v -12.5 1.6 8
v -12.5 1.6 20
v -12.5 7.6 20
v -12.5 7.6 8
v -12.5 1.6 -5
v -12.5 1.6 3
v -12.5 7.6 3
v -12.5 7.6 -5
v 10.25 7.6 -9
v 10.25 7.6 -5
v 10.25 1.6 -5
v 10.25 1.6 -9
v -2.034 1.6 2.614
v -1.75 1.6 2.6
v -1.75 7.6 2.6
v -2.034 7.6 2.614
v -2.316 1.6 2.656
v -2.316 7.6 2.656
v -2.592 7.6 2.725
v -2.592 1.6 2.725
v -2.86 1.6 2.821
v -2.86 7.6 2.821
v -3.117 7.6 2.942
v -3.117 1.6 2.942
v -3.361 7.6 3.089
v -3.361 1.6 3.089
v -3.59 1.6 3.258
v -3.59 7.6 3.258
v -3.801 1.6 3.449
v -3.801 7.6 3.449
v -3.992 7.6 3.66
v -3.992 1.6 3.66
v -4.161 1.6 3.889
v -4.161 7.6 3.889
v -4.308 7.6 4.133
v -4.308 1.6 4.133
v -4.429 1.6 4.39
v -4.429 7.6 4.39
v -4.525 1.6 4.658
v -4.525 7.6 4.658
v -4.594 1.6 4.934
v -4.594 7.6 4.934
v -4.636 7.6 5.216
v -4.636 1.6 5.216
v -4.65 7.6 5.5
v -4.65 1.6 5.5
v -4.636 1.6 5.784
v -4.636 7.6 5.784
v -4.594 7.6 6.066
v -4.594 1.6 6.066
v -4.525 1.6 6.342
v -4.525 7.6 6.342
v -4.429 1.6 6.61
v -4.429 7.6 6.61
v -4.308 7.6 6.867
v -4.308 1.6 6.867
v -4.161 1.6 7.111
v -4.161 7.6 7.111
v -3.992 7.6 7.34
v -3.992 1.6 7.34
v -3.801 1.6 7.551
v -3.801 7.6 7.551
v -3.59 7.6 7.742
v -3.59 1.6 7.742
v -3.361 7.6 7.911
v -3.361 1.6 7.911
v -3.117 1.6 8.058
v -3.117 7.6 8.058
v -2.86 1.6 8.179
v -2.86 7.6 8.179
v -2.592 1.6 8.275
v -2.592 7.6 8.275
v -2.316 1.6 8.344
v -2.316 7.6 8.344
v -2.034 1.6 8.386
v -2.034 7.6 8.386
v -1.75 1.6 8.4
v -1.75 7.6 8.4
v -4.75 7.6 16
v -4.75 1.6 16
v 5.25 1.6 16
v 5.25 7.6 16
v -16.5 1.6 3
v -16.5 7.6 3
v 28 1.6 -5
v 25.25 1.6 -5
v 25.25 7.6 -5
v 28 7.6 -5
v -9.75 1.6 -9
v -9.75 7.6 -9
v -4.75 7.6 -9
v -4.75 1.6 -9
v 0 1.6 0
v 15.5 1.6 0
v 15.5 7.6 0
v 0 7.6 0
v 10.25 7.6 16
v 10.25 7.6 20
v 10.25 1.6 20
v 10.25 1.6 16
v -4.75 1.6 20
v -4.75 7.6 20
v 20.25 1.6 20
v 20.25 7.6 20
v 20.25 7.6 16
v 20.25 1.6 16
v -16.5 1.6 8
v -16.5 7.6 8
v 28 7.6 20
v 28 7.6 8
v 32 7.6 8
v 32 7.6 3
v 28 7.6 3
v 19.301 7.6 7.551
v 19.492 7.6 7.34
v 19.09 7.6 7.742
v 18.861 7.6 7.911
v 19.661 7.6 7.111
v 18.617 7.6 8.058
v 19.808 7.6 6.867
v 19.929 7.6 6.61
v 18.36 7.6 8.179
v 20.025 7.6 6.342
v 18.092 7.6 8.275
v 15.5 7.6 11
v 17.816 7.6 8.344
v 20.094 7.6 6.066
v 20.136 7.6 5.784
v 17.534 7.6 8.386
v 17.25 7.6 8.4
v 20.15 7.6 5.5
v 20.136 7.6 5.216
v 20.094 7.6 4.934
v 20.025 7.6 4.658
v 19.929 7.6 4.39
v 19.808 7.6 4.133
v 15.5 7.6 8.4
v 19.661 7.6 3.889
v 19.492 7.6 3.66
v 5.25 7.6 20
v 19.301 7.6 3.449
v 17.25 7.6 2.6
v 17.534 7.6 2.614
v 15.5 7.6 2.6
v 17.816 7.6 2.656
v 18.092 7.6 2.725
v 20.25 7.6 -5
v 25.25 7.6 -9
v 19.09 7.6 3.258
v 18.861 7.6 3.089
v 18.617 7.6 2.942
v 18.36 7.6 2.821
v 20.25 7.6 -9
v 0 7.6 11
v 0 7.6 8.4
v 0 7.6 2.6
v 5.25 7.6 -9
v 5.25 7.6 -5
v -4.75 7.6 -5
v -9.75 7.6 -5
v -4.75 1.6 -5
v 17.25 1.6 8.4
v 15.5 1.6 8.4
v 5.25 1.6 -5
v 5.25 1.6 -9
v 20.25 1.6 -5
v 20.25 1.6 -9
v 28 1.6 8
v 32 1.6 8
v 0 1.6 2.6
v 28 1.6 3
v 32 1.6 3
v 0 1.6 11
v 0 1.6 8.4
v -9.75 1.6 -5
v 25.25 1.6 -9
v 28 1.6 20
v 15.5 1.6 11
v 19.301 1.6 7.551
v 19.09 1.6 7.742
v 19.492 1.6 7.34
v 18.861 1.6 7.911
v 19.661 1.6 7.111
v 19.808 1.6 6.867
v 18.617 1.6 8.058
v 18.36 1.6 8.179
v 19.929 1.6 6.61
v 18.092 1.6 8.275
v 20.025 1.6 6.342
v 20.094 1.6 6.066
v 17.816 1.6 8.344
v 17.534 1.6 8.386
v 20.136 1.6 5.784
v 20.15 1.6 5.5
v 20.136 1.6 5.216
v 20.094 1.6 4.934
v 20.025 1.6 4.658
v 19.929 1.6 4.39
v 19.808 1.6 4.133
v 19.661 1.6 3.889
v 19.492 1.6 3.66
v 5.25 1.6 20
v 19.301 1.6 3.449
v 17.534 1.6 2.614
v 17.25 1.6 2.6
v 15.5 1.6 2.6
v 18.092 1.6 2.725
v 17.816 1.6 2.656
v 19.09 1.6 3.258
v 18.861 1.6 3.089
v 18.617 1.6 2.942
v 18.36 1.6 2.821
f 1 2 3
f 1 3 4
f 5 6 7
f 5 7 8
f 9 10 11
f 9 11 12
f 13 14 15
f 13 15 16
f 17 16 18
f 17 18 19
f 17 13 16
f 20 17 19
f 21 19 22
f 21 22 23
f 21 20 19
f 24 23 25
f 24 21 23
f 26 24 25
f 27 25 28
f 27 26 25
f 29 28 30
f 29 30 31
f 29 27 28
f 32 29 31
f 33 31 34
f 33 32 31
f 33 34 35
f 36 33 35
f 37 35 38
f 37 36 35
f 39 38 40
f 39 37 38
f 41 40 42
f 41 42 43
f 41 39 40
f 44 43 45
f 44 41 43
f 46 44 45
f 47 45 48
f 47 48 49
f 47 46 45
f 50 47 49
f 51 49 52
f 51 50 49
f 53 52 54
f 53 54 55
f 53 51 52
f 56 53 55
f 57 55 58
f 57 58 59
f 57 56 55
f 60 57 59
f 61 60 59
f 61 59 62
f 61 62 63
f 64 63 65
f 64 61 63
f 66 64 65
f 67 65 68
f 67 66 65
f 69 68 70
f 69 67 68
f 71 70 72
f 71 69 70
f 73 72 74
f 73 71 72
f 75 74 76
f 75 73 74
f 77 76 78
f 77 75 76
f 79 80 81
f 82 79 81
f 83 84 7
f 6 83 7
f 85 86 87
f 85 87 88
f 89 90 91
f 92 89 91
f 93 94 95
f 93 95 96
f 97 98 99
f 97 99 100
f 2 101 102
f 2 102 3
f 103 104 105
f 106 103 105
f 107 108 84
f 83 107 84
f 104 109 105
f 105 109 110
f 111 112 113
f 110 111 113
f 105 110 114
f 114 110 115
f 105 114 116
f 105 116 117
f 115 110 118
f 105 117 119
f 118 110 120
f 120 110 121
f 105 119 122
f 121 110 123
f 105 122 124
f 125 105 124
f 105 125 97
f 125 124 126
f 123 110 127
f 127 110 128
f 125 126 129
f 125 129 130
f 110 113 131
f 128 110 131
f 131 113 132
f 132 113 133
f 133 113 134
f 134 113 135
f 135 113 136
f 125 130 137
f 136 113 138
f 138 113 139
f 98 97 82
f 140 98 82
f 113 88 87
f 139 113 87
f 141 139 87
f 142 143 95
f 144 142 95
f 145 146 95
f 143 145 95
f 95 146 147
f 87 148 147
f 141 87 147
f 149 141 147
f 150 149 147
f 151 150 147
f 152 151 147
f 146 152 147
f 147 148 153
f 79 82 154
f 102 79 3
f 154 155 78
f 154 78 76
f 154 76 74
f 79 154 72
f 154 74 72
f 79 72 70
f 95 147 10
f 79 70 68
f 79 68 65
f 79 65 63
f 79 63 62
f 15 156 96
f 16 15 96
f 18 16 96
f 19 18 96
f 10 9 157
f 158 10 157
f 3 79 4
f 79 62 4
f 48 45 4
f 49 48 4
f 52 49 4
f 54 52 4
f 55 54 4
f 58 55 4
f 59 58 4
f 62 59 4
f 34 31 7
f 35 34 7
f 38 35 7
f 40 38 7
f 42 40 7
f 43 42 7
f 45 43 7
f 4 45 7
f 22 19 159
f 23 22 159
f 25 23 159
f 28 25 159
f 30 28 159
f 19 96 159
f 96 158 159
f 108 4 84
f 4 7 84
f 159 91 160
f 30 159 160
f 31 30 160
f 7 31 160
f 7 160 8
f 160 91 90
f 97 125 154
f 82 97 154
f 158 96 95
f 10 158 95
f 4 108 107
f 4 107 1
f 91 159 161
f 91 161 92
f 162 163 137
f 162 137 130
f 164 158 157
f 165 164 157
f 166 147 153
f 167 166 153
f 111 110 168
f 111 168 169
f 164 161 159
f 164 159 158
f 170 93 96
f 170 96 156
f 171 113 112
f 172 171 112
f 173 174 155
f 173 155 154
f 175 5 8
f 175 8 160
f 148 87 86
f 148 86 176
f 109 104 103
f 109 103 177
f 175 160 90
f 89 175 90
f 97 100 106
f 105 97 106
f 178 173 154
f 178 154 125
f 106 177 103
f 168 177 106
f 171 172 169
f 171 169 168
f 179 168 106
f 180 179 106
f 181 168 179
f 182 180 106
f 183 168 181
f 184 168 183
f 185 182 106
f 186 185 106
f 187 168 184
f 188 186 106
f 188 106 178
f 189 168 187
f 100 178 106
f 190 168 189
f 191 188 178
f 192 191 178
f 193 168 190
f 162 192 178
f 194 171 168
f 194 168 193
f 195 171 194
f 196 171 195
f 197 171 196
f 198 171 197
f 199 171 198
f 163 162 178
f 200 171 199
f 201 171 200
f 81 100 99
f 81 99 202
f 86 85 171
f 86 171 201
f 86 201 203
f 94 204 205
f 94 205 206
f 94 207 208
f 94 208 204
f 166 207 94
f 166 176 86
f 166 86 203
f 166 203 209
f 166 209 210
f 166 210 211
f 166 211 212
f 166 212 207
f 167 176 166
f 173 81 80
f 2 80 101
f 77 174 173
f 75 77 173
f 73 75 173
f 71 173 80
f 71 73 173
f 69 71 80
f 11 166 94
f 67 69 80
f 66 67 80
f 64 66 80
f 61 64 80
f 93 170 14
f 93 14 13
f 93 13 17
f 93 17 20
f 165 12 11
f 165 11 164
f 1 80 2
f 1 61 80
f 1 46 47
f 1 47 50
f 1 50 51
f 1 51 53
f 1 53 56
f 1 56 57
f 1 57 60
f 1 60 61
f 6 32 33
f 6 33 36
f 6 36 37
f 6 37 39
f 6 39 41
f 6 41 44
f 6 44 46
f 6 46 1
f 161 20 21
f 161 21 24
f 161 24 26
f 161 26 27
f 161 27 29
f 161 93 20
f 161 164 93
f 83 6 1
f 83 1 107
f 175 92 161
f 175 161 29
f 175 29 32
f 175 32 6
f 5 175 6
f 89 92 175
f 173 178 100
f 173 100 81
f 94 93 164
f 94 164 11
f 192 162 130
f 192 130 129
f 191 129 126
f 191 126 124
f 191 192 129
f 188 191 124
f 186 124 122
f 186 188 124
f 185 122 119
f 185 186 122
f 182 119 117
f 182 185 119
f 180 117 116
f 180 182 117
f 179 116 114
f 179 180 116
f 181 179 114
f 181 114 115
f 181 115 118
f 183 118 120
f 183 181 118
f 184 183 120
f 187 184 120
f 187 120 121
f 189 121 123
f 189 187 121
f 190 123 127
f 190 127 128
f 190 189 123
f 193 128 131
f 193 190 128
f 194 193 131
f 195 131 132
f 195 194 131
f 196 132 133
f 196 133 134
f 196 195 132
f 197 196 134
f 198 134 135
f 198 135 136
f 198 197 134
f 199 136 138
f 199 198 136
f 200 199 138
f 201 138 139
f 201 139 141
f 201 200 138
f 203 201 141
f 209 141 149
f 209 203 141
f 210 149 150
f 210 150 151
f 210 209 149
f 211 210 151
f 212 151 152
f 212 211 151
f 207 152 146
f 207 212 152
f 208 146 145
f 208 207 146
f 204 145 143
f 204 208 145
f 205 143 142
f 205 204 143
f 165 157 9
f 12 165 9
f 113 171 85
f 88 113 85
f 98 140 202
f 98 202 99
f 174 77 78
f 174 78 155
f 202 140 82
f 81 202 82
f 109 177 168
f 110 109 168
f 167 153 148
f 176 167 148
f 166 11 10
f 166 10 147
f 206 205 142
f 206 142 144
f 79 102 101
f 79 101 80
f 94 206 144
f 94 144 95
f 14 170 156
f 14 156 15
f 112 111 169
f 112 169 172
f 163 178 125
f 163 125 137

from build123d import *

# Parameters (mm, degrees)
SKETCH1_W           = 15.5
SKETCH1_H           = 11
BOSS_EXTRUDE1_DEPTH = 1.6
BOSS_EXTRUDE2_DEPTH = 1.6
SKETCH3_W           = 40.5
SKETCH3_H           = 21
BOSS_EXTRUDE3_DEPTH = 6
CUT_EXTRUDE1_DEPTH  = 2.6
SKETCH5_W           = 5
SKETCH5_H           = 4
BOSS_EXTRUDE4_DEPTH = 6
LPATTERN1_COUNT     = 2
LPATTERN1_PITCH     = 15
LPATTERN1_COL_COUNT = 2
LPATTERN1_COL_PITCH = 15
SKETCH6_W           = 4
SKETCH6_H           = 5
BOSS_EXTRUDE5_DEPTH = 6
SKETCH7_W           = 2.75
SKETCH7_H           = 4
BOSS_EXTRUDE6_DEPTH = 6


with BuildPart() as part:
    # Sketch1 → Boss-Extrude1 (new body)
    with BuildSketch(Plane(origin=(0, 0, 0), x_dir=(1, 0, 0), z_dir=(0, 1, 0))):
        with Locations((7.75, -5.5)):
            Rectangle(SKETCH1_W, SKETCH1_H)
    extrude(amount=BOSS_EXTRUDE1_DEPTH)

    # Sketch2 → Boss-Extrude2 (add, through all)
    with BuildSketch(Plane(origin=(0, 1.6, 0), x_dir=(1, 0, 0), z_dir=(0, 1, 0))):
        with BuildLine():
            Line((-1.75, -4), (-1.75, -2.6))
            ThreePointArc((-1.75, -2.6), (-4.65, -5.5), (-1.75, -8.4))
            Line((-1.75, -8.4), (-1.75, -7))
            ThreePointArc((-1.75, -7), (-3.25, -5.5), (-1.75, -4))
        make_face()
        with BuildLine():
            ThreePointArc((0, -3.187533784), (-0.827002716, -2.750804479), (-1.75, -2.6))
            Line((-1.75, -2.6), (-1.75, -4))
            ThreePointArc((-1.75, -4), (-0.689339828, -4.439339828), (-0.25, -5.5))
            ThreePointArc((-0.25, -5.5), (-0.689339828, -6.560660172), (-1.75, -7))
            Line((-1.75, -7), (-1.75, -8.4))
            ThreePointArc((-1.75, -8.4), (-0.827002716, -8.249195521), (0, -7.812466216))
            Line((0, -7.812466216), (0, -3.187533784))
        make_face()
        with BuildLine():
            Line((0, -2.6), (-1.75, -2.6))
            ThreePointArc((-1.75, -2.6), (-0.827002716, -2.750804479), (0, -3.187533784))
            Line((0, -3.187533784), (0, -2.6))
        make_face()
        with BuildLine():
            ThreePointArc((0, -7.812466216), (-0.827002716, -8.249195521), (-1.75, -8.4))
            Line((-1.75, -8.4), (0, -8.4))
            Line((0, -8.4), (0, -7.812466216))
        make_face()
        with BuildLine():
            ThreePointArc((20.15, -5.5), (19.300609665, -3.449390335), (17.25, -2.6))
            Line((17.25, -2.6), (17.25, -4))
            ThreePointArc((17.25, -4), (18.310660172, -4.439339828), (18.75, -5.5))
            ThreePointArc((18.75, -5.5), (18.310660172, -6.560660172), (17.25, -7))
            Line((17.25, -7), (17.25, -8.4))
            ThreePointArc((17.25, -8.4), (19.300609665, -7.550609665), (20.15, -5.5))
        make_face()
        with BuildLine():
            Line((17.25, -4), (17.25, -2.6))
            ThreePointArc((17.25, -2.6), (16.327002716, -2.750804479), (15.5, -3.187533784))
            Line((15.5, -3.187533784), (15.5, -7.812466216))
            ThreePointArc((15.5, -7.812466216), (16.327002716, -8.249195521), (17.25, -8.4))
            Line((17.25, -8.4), (17.25, -7))
            ThreePointArc((17.25, -7), (15.75, -5.5), (17.25, -4))
        make_face()
        with BuildLine():
            Line((17.25, -2.6), (15.5, -2.6))
            Line((15.5, -2.6), (15.5, -3.187533784))
            ThreePointArc((15.5, -3.187533784), (16.327002716, -2.750804479), (17.25, -2.6))
        make_face()
        with BuildLine():
            Line((15.5, -7.812466216), (15.5, -8.4))
            Line((15.5, -8.4), (17.25, -8.4))
            ThreePointArc((17.25, -8.4), (16.327002716, -8.249195521), (15.5, -7.812466216))
        make_face()
    extrude(amount=-BOSS_EXTRUDE2_DEPTH)

    # Sketch4 → Cut-Extrude1 (cut, through all)
    with BuildSketch(Plane(origin=(0, 1.6, 0), x_dir=(1, 0, 0), z_dir=(0, 1, 0))):
        with BuildLine():
            Line((0, 0), (0, -2.6))
            Line((0, -2.6), (-1.75, -2.6))
            ThreePointArc((-1.75, -2.6), (-4.65, -5.5), (-1.75, -8.4))
            Line((-1.75, -8.4), (0, -8.4))
            Line((0, -8.4), (0, -11))
            Line((0, -11), (15.5, -11))
            Line((15.5, -11), (15.5, -8.4))
            Line((15.5, -8.4), (17.25, -8.4))
            ThreePointArc((17.25, -8.4), (20.15, -5.5), (17.25, -2.6))
            Line((17.25, -2.6), (15.5, -2.6))
            Line((15.5, -2.6), (15.5, 0))
            Line((15.5, 0), (0, 0))
        make_face()
    extrude(amount=-CUT_EXTRUDE1_DEPTH, mode=Mode.SUBTRACT)


with BuildPart() as body_2:
    # Sketch3 → Boss-Extrude3 (new body)
    with BuildSketch(Plane(origin=(0, 1.6, 0), x_dir=(1, 0, 0), z_dir=(0, 1, 0))):
        with Locations((7.75, -5.5)):
            Rectangle(SKETCH3_W, SKETCH3_H)
        with BuildLine():
            Line((0, 0), (0, -2.6))
            Line((0, -2.6), (-1.75, -2.6))
            ThreePointArc((-1.75, -2.6), (-4.65, -5.5), (-1.75, -8.4))
            Line((-1.75, -8.4), (0, -8.4))
            Line((0, -8.4), (0, -11))
            Line((0, -11), (15.5, -11))
            Line((15.5, -11), (15.5, -8.4))
            Line((15.5, -8.4), (17.25, -8.4))
            ThreePointArc((17.25, -8.4), (20.15, -5.5), (17.25, -2.6))
            Line((17.25, -2.6), (15.5, -2.6))
            Line((15.5, -2.6), (15.5, 0))
            Line((15.5, 0), (0, 0))
        make_face(mode=Mode.SUBTRACT)
    extrude(amount=BOSS_EXTRUDE3_DEPTH)

    # Sketch5 → Boss-Extrude4 (add, through all)
    with BuildSketch(Plane(origin=(0, 7.6, 0), x_dir=(1, 0, 0), z_dir=(0, 1, 0))):
        with Locations((7.75, 7)):
            Rectangle(SKETCH5_W, SKETCH5_H)
        with Locations((7.75, -18)):
            Rectangle(SKETCH5_W, SKETCH5_H)
    boss_extrude4 = extrude(amount=-BOSS_EXTRUDE4_DEPTH)

    # LPattern1: Boss-Extrude4 ×2
    with Locations(*[(i * LPATTERN1_PITCH, 0, 0) for i in range(1, LPATTERN1_COUNT)]):
        add(boss_extrude4)

    # LPattern1 col: Boss-Extrude4 ×2
    with Locations(*[(-i * LPATTERN1_COL_PITCH, 0, 0) for i in range(1, LPATTERN1_COL_COUNT)]):
        add(boss_extrude4)

    # Sketch6 → Boss-Extrude5 (add, through all)
    with BuildSketch(Plane(origin=(0, 7.6, 0), x_dir=(1, 0, 0), z_dir=(0, 1, 0))):
        with Locations((-14.5, -5.5)):
            Rectangle(SKETCH6_W, SKETCH6_H)
        with Locations((30, -5.5)):
            Rectangle(SKETCH6_W, SKETCH6_H)
    extrude(amount=-BOSS_EXTRUDE5_DEPTH)

    # Sketch7 → Boss-Extrude6 (add, through all)
    with BuildSketch(Plane(origin=(0, 1.6, 0), x_dir=(-1, 0, 0), z_dir=(0, -1, 0))):
        with Locations((11.125, -18)):
            Rectangle(SKETCH7_W, SKETCH7_H)
        with Locations((-26.625, -18)):
            Rectangle(SKETCH7_W, SKETCH7_H)
    extrude(amount=-BOSS_EXTRUDE6_DEPTH)


solid = body_2.part
